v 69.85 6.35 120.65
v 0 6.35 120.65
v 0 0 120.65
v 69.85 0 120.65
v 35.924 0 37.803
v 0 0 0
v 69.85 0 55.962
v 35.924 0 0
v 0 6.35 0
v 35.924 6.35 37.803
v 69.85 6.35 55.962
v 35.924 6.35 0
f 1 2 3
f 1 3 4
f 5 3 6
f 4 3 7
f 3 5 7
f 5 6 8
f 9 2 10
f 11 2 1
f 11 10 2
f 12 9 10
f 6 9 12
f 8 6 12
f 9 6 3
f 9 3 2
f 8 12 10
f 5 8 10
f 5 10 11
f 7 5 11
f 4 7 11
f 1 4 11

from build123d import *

# Parameters (mm, degrees)
SKETCH1_W           = 69.85
SKETCH1_H           = 6.35
BOSS_EXTRUDE1_DEPTH = 120.65
CUT_EXTRUDE1_DEPTH  = 140.555607197


with BuildPart() as part:
    # Sketch1 → Boss-Extrude1 (new body)
    with BuildSketch(Plane.XY):
        with Locations((34.925, 3.175)):
            Rectangle(SKETCH1_W, SKETCH1_H)
    extrude(amount=BOSS_EXTRUDE1_DEPTH)

    # Sketch2 → Cut-Extrude1 (cut, through all)
    with BuildSketch(Plane(origin=(0, 6.35, 0), x_dir=(1, 0, 0), z_dir=(0, 1, 0))):
        Polygon((35.923749516, 0), (35.923749516, -37.802999389), (69.85, -55.962276793), (69.85, 0), align=None)
    extrude(amount=-CUT_EXTRUDE1_DEPTH, mode=Mode.SUBTRACT)


solid = part.part
